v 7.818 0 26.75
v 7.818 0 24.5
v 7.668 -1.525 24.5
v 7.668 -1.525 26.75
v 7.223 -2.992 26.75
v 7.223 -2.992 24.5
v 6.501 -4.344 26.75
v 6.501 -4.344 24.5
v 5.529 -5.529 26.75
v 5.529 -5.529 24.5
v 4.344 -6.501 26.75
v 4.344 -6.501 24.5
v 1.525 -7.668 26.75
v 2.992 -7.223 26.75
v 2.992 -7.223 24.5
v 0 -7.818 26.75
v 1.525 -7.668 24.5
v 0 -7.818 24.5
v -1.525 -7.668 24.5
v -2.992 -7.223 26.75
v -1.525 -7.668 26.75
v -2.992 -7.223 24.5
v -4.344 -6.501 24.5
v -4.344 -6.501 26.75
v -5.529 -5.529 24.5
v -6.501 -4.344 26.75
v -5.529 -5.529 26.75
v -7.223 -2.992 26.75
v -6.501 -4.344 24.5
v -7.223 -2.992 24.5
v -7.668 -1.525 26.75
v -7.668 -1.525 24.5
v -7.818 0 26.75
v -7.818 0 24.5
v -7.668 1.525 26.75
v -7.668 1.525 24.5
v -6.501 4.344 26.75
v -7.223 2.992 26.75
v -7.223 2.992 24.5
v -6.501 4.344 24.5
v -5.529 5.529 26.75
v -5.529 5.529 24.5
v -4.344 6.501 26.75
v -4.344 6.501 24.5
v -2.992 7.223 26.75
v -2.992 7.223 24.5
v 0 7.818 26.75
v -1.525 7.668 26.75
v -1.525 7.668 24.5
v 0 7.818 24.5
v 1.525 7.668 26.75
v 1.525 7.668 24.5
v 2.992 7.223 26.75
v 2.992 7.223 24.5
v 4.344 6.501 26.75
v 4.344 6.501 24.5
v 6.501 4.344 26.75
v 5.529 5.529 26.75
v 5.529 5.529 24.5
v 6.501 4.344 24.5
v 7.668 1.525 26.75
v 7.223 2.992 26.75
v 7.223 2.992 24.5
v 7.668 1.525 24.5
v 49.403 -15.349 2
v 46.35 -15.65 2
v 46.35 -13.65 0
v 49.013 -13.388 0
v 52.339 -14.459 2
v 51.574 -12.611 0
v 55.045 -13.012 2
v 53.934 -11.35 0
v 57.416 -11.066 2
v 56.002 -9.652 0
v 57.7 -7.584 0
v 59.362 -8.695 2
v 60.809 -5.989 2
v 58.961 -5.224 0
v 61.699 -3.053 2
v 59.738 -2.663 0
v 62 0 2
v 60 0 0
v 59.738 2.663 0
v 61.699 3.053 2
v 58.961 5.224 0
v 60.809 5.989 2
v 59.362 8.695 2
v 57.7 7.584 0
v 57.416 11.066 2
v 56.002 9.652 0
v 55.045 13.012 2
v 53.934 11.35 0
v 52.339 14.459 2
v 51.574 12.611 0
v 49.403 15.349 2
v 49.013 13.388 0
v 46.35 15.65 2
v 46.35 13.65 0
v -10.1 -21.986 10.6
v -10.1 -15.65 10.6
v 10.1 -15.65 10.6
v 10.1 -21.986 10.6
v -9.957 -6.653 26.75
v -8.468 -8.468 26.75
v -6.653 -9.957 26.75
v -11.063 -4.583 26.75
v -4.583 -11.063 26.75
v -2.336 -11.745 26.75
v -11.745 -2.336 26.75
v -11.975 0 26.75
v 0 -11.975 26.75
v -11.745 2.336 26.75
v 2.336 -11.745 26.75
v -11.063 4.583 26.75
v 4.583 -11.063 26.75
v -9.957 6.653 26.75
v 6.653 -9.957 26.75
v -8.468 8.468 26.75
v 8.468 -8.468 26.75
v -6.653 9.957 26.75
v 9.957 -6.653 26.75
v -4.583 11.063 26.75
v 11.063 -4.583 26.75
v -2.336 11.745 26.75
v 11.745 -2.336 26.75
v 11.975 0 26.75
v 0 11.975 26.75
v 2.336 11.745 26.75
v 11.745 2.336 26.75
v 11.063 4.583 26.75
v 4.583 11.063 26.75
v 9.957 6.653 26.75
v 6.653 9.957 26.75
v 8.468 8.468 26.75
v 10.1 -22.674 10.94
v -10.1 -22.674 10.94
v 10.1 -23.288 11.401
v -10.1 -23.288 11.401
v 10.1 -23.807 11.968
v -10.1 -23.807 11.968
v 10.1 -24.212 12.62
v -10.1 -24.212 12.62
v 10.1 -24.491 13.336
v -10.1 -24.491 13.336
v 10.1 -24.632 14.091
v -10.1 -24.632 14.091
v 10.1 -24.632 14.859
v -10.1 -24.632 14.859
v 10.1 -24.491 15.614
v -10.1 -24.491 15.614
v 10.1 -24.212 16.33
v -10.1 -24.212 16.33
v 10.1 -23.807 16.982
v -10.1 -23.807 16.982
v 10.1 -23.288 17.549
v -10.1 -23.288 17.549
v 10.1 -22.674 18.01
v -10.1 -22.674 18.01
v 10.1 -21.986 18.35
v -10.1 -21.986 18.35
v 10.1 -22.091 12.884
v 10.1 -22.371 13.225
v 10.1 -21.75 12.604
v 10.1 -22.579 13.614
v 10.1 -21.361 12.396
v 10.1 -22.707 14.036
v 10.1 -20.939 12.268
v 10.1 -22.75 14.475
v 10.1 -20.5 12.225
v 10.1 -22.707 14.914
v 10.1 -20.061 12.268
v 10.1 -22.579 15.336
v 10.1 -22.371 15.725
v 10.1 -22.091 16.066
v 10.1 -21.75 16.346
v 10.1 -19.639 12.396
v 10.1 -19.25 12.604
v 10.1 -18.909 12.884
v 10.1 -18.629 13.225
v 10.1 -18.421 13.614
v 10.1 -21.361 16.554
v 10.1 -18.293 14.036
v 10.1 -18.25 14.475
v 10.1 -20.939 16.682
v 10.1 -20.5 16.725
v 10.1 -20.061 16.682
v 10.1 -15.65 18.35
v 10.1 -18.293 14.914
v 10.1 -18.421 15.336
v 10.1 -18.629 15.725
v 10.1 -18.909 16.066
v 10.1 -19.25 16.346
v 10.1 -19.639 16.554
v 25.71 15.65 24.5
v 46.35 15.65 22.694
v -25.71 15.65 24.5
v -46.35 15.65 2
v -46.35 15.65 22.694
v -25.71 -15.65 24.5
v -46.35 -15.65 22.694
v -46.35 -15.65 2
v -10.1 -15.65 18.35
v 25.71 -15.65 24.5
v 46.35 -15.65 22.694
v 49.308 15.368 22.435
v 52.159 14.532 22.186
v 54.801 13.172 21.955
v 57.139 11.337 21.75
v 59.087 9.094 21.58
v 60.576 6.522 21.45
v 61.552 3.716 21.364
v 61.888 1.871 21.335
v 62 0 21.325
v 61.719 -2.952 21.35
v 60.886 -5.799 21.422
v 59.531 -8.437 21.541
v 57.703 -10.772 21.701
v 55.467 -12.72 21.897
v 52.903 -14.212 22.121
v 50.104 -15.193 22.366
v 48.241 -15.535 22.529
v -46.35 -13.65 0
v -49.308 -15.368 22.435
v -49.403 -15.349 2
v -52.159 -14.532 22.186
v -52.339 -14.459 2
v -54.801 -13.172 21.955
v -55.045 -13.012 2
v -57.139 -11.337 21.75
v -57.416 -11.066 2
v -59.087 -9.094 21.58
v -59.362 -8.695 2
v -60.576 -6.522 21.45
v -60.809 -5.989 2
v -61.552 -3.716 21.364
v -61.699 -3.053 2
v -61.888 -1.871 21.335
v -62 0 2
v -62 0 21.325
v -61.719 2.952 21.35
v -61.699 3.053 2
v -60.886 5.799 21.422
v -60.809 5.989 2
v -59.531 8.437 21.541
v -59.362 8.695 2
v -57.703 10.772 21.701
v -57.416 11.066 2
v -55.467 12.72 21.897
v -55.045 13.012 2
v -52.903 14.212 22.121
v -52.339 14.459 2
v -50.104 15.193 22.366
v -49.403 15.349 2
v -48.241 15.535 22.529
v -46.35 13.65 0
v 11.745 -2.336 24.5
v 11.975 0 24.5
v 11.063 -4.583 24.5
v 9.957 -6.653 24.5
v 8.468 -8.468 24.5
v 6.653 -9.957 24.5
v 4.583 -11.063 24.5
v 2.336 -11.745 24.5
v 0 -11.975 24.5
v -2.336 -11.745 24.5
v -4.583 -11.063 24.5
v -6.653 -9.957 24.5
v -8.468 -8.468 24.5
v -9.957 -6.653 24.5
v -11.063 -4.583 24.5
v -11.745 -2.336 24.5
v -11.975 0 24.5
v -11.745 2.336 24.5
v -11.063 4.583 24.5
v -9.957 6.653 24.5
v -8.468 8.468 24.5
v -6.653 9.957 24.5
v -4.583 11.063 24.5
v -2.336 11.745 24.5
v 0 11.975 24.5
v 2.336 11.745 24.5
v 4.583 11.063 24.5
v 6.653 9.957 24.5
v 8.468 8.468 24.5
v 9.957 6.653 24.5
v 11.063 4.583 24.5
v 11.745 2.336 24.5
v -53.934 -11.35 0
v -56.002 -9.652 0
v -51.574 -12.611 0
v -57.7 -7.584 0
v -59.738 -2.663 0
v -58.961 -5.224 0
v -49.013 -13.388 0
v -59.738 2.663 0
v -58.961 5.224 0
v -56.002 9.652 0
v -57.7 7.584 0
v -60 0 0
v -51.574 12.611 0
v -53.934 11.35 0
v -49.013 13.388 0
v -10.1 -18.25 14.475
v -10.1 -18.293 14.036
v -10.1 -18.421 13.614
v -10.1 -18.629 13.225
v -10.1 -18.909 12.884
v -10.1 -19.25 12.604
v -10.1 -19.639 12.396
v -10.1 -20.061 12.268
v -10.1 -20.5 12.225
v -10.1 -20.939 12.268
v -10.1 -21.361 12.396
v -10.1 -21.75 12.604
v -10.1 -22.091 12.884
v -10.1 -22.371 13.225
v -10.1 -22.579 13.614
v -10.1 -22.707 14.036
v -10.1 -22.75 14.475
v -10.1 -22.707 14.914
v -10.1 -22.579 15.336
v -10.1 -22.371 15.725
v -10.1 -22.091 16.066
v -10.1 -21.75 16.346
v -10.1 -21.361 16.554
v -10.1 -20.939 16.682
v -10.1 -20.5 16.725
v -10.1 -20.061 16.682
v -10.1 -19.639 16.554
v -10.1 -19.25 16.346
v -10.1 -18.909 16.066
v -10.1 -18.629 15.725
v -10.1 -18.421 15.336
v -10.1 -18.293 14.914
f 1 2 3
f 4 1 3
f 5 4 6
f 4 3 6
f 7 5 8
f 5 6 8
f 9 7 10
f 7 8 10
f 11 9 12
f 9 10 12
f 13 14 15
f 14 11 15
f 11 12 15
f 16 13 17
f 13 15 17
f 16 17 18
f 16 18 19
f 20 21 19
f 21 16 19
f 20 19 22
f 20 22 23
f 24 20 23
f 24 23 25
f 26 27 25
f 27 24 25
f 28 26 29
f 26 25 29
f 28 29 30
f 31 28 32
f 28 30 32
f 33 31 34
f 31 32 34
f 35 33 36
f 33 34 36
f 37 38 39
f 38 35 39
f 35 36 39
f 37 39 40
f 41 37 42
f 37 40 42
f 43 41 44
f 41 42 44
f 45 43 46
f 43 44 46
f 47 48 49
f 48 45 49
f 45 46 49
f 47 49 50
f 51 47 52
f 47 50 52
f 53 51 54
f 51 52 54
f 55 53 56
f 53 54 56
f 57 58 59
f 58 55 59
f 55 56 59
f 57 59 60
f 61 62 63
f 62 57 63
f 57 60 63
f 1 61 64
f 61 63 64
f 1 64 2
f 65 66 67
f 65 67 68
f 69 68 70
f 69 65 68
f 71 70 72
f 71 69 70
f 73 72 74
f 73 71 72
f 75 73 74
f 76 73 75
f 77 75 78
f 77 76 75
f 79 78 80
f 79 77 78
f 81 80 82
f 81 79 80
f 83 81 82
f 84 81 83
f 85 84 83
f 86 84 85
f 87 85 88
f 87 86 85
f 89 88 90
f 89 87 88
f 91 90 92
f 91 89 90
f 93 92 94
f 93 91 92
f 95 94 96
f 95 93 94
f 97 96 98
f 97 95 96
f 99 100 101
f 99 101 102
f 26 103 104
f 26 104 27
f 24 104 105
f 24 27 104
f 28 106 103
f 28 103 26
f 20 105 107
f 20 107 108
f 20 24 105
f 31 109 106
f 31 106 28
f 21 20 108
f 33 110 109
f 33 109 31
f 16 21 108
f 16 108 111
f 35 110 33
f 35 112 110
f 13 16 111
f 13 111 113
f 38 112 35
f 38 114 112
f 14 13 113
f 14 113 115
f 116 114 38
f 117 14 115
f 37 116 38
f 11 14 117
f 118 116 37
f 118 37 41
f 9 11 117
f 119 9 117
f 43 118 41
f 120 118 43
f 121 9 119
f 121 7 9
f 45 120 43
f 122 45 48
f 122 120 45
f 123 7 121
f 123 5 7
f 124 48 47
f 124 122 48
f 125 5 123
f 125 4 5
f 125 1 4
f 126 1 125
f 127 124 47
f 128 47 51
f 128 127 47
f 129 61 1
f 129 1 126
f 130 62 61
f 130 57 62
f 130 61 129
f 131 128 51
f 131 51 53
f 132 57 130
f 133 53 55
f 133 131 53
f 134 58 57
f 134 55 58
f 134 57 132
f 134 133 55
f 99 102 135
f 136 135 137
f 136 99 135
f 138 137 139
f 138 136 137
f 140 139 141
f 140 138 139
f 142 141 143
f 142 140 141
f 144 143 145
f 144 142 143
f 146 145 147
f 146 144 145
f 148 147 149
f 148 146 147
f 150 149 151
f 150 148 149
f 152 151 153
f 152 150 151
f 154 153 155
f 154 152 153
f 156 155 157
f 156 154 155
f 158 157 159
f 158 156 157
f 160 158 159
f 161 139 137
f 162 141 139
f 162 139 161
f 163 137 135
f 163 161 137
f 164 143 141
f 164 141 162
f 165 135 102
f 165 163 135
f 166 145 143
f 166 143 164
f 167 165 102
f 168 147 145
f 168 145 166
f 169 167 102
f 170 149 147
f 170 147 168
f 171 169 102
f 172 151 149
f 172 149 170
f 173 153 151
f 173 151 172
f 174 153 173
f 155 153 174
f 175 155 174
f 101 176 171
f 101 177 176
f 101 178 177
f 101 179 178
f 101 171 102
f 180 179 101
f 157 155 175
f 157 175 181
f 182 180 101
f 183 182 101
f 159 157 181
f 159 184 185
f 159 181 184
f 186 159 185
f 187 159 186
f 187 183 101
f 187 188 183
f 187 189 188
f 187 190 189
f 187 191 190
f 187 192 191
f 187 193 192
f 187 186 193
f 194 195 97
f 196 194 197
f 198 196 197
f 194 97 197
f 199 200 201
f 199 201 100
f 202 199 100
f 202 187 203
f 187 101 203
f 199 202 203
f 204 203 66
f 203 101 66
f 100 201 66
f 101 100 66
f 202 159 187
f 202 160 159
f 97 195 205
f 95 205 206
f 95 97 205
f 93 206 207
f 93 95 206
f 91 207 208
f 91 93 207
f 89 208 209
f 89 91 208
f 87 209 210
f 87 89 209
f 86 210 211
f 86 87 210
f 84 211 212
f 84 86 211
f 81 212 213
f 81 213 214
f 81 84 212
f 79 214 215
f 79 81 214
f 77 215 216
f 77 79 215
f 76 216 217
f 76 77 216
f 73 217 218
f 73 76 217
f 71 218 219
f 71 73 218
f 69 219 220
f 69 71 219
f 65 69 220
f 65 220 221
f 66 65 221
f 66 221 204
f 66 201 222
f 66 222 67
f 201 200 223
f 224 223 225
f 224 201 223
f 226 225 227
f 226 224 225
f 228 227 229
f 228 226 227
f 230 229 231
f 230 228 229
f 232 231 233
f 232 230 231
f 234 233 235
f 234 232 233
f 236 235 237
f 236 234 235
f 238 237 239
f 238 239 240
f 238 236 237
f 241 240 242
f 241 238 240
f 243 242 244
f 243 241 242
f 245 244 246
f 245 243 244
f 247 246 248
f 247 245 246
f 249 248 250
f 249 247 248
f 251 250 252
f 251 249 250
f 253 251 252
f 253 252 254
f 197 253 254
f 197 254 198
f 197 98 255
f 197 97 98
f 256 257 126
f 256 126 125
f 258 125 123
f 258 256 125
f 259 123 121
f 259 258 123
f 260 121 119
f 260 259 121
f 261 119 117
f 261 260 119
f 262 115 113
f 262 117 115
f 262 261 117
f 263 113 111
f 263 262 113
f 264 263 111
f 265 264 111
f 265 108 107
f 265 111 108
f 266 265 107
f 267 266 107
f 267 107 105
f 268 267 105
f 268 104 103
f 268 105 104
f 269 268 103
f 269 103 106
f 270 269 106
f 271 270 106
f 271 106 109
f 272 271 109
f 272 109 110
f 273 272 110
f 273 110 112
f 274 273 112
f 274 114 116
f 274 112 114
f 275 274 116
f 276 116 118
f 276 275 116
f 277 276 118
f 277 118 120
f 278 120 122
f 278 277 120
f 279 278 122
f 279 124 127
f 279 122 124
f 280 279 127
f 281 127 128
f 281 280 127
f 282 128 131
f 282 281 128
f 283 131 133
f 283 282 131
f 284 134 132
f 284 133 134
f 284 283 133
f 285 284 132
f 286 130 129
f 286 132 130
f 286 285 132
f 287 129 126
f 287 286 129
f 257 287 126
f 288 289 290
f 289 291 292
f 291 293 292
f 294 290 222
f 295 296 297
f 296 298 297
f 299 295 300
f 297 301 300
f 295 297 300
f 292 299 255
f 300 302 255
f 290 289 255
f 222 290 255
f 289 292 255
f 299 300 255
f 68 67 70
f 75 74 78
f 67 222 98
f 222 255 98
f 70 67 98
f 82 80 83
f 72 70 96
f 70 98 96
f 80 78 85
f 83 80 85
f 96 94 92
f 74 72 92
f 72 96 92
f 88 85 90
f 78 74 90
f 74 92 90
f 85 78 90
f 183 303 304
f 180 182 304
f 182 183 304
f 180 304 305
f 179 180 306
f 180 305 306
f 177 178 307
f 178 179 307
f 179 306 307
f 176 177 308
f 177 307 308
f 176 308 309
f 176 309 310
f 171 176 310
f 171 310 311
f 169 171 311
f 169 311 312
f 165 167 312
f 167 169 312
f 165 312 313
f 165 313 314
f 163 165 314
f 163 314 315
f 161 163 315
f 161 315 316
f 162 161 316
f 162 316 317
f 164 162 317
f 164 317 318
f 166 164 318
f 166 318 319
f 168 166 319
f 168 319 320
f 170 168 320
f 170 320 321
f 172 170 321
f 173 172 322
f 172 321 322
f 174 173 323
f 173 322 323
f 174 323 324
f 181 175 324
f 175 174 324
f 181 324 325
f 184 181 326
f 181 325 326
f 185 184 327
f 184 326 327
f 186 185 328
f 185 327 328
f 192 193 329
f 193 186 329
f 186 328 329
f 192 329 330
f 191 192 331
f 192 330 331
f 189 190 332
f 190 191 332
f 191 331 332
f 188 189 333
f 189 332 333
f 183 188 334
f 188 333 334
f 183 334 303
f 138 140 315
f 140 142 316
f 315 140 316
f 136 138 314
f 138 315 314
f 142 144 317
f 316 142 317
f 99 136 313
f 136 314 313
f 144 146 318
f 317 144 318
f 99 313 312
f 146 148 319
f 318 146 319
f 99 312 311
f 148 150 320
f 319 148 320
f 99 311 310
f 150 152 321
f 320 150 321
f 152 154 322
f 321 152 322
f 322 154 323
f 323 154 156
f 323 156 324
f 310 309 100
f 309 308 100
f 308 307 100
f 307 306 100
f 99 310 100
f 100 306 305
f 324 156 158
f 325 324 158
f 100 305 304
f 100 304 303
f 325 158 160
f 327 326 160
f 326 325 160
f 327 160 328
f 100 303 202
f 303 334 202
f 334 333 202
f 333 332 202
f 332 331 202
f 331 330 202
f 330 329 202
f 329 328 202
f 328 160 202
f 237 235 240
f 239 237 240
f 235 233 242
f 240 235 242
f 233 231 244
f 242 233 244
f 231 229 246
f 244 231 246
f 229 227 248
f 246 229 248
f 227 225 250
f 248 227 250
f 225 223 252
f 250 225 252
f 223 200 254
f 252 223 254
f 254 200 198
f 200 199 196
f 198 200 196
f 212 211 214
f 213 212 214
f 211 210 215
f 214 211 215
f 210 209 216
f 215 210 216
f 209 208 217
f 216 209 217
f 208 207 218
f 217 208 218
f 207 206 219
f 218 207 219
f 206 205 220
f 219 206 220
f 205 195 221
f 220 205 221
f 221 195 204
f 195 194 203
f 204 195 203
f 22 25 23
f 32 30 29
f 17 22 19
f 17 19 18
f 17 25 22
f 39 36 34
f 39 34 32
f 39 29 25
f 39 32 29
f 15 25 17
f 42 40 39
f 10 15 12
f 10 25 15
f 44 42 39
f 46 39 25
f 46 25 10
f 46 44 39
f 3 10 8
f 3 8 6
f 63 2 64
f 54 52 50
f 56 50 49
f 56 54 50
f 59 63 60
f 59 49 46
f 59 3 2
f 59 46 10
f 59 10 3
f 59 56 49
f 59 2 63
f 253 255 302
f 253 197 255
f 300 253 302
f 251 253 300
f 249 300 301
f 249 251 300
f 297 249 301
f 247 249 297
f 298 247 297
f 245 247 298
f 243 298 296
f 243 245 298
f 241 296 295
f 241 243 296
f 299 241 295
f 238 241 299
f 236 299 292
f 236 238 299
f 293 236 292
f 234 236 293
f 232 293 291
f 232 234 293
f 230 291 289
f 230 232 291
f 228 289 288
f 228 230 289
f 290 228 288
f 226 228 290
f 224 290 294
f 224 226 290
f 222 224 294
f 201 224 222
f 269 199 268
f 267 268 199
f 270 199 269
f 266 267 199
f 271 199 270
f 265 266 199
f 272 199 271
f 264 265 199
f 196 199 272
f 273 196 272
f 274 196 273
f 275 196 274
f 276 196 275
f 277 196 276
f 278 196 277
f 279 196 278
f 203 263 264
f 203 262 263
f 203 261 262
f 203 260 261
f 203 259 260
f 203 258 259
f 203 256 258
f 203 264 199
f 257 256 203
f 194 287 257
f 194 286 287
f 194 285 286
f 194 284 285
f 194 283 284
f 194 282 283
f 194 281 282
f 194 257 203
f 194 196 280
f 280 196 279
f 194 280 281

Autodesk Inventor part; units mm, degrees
ref_plane "YZ Plane" through (0, 0, 0) normal (1, 0, 0) x (0, 1, 0)
ref_plane "XZ Plane" through (0, 0, 0) normal (0, 1, 0) x (-1, 0, 0)
ref_plane "XY Plane" through (0, 0, 0) normal (0, 0, 1) x (1, 0, 0)
sketch "Sketch1" plane through (0, 0, 0) normal (0, 0, 1) x (1, 0, 0)
  line L0 (-62, -15.65) -> (62, -15.65)
  line L1 (62, -15.65) -> (62, 15.65)
  line L2 (62, 15.65) -> (-62, 15.65)
  line L3 (-62, 15.65) -> (-62, -15.65)
  line L4 (-62, -15.65) -> (62, 15.65) construction
  line L5 (62, -15.65) -> (-62, 15.65) construction
  line L6 (-62, 0) -> (62, 0) construction
  line L7 (-46.35, -15.65) -> (46.35, -15.65)
  line L8 (46.35, 15.65) -> (-46.35, 15.65)
  arc A0 (-46.35, 15.65) -> (-46.35, -15.65) centre (-46.35, 0) ccw
  arc A1 (46.35, -15.65) -> (46.35, 15.65) centre (46.35, 0) ccw
  point P0 (0, 0)
  point P1 (0, 0)
  point P2 (-62, 0)
  point P3 (-46.35, 15.65)
  point P4 (62, 0)
  point P5 (46.35, -15.65)
  dimension "d0" = 124
  dimension "d1" = 31.3
extrude "Extrusion1" add sketch "Sketch1" along normal blind 24.5
sketch "Sketch2" plane through (0, 0, 24.5) normal (0, 0, 1) x (1, 0, 0)
  circle A0 centre (0, 0) radius 11.975
  circle A1 centre (0, 0) radius 7.8185
  dimension "d4" = 23.95
extrude "Extrusion2" add sketch "Sketch2" along normal blind 2.25
chamfer "Chamfer1" distance 3.175 angle 85 1 edges at (62, 0, 24.5) measured on face at (62, -5.2167, 8.1667)
chamfer "Chamfer2" distance 3.175 angle 85 1 edges at (-62, 0, 24.5) measured on face at (-62, 5.2167, 8.1667)
extrude "Extrusion3" cut sketch "Sketch1" along normal blind 24.5 contours L3 A0 L0 | L3 L2 A0 | A1 L1 L0 | A1 L2 L1
chamfer "Chamfer3" distance 2 angle 45 2 edges at (62, 0, 0) (-62, 0, 0)
sketch "Sketch4" plane through (0, 0, 0) normal (1, 0, 0) x (0, 1, 0)
  line L0 (15.65, 24.5) -> (-15.65, 24.5) construction
  line L1 (-15.65, 24.5) -> (-15.65, 0) construction
  line L2 (-15.65, 10.6) -> (-24.65, 10.6)
  line L3 (-24.65, 10.6) -> (-24.65, 18.35)
  line L4 (-24.65, 18.35) -> (-15.65, 18.35)
  line L5 (-15.65, 18.35) -> (-15.65, 10.6)
  circle A0 centre (-20.5, 14.475) radius 2.25
  arc A1 (-21.9856, 18.35) -> (-21.9856, 10.6) centre (-20.5, 14.475) ccw
  line L6 (-15.65, 14.475) -> (-24.65, 14.475) construction
  point P0 (0, 0)
  point P1 (-13.65, 0)
  point P2 (-15.65, 2)
  dimension "d19" = 10.6
  dimension "d20" = 9
  dimension "d21" = 7.75
  dimension "d22" = 4.5
  dimension "d23" = 1.9
extrude "Extrusion4" add sketch "Sketch4" along normal mid plane 20.2 contours L2 A1 L4 L5
properties part number "Emeet_Camera"
